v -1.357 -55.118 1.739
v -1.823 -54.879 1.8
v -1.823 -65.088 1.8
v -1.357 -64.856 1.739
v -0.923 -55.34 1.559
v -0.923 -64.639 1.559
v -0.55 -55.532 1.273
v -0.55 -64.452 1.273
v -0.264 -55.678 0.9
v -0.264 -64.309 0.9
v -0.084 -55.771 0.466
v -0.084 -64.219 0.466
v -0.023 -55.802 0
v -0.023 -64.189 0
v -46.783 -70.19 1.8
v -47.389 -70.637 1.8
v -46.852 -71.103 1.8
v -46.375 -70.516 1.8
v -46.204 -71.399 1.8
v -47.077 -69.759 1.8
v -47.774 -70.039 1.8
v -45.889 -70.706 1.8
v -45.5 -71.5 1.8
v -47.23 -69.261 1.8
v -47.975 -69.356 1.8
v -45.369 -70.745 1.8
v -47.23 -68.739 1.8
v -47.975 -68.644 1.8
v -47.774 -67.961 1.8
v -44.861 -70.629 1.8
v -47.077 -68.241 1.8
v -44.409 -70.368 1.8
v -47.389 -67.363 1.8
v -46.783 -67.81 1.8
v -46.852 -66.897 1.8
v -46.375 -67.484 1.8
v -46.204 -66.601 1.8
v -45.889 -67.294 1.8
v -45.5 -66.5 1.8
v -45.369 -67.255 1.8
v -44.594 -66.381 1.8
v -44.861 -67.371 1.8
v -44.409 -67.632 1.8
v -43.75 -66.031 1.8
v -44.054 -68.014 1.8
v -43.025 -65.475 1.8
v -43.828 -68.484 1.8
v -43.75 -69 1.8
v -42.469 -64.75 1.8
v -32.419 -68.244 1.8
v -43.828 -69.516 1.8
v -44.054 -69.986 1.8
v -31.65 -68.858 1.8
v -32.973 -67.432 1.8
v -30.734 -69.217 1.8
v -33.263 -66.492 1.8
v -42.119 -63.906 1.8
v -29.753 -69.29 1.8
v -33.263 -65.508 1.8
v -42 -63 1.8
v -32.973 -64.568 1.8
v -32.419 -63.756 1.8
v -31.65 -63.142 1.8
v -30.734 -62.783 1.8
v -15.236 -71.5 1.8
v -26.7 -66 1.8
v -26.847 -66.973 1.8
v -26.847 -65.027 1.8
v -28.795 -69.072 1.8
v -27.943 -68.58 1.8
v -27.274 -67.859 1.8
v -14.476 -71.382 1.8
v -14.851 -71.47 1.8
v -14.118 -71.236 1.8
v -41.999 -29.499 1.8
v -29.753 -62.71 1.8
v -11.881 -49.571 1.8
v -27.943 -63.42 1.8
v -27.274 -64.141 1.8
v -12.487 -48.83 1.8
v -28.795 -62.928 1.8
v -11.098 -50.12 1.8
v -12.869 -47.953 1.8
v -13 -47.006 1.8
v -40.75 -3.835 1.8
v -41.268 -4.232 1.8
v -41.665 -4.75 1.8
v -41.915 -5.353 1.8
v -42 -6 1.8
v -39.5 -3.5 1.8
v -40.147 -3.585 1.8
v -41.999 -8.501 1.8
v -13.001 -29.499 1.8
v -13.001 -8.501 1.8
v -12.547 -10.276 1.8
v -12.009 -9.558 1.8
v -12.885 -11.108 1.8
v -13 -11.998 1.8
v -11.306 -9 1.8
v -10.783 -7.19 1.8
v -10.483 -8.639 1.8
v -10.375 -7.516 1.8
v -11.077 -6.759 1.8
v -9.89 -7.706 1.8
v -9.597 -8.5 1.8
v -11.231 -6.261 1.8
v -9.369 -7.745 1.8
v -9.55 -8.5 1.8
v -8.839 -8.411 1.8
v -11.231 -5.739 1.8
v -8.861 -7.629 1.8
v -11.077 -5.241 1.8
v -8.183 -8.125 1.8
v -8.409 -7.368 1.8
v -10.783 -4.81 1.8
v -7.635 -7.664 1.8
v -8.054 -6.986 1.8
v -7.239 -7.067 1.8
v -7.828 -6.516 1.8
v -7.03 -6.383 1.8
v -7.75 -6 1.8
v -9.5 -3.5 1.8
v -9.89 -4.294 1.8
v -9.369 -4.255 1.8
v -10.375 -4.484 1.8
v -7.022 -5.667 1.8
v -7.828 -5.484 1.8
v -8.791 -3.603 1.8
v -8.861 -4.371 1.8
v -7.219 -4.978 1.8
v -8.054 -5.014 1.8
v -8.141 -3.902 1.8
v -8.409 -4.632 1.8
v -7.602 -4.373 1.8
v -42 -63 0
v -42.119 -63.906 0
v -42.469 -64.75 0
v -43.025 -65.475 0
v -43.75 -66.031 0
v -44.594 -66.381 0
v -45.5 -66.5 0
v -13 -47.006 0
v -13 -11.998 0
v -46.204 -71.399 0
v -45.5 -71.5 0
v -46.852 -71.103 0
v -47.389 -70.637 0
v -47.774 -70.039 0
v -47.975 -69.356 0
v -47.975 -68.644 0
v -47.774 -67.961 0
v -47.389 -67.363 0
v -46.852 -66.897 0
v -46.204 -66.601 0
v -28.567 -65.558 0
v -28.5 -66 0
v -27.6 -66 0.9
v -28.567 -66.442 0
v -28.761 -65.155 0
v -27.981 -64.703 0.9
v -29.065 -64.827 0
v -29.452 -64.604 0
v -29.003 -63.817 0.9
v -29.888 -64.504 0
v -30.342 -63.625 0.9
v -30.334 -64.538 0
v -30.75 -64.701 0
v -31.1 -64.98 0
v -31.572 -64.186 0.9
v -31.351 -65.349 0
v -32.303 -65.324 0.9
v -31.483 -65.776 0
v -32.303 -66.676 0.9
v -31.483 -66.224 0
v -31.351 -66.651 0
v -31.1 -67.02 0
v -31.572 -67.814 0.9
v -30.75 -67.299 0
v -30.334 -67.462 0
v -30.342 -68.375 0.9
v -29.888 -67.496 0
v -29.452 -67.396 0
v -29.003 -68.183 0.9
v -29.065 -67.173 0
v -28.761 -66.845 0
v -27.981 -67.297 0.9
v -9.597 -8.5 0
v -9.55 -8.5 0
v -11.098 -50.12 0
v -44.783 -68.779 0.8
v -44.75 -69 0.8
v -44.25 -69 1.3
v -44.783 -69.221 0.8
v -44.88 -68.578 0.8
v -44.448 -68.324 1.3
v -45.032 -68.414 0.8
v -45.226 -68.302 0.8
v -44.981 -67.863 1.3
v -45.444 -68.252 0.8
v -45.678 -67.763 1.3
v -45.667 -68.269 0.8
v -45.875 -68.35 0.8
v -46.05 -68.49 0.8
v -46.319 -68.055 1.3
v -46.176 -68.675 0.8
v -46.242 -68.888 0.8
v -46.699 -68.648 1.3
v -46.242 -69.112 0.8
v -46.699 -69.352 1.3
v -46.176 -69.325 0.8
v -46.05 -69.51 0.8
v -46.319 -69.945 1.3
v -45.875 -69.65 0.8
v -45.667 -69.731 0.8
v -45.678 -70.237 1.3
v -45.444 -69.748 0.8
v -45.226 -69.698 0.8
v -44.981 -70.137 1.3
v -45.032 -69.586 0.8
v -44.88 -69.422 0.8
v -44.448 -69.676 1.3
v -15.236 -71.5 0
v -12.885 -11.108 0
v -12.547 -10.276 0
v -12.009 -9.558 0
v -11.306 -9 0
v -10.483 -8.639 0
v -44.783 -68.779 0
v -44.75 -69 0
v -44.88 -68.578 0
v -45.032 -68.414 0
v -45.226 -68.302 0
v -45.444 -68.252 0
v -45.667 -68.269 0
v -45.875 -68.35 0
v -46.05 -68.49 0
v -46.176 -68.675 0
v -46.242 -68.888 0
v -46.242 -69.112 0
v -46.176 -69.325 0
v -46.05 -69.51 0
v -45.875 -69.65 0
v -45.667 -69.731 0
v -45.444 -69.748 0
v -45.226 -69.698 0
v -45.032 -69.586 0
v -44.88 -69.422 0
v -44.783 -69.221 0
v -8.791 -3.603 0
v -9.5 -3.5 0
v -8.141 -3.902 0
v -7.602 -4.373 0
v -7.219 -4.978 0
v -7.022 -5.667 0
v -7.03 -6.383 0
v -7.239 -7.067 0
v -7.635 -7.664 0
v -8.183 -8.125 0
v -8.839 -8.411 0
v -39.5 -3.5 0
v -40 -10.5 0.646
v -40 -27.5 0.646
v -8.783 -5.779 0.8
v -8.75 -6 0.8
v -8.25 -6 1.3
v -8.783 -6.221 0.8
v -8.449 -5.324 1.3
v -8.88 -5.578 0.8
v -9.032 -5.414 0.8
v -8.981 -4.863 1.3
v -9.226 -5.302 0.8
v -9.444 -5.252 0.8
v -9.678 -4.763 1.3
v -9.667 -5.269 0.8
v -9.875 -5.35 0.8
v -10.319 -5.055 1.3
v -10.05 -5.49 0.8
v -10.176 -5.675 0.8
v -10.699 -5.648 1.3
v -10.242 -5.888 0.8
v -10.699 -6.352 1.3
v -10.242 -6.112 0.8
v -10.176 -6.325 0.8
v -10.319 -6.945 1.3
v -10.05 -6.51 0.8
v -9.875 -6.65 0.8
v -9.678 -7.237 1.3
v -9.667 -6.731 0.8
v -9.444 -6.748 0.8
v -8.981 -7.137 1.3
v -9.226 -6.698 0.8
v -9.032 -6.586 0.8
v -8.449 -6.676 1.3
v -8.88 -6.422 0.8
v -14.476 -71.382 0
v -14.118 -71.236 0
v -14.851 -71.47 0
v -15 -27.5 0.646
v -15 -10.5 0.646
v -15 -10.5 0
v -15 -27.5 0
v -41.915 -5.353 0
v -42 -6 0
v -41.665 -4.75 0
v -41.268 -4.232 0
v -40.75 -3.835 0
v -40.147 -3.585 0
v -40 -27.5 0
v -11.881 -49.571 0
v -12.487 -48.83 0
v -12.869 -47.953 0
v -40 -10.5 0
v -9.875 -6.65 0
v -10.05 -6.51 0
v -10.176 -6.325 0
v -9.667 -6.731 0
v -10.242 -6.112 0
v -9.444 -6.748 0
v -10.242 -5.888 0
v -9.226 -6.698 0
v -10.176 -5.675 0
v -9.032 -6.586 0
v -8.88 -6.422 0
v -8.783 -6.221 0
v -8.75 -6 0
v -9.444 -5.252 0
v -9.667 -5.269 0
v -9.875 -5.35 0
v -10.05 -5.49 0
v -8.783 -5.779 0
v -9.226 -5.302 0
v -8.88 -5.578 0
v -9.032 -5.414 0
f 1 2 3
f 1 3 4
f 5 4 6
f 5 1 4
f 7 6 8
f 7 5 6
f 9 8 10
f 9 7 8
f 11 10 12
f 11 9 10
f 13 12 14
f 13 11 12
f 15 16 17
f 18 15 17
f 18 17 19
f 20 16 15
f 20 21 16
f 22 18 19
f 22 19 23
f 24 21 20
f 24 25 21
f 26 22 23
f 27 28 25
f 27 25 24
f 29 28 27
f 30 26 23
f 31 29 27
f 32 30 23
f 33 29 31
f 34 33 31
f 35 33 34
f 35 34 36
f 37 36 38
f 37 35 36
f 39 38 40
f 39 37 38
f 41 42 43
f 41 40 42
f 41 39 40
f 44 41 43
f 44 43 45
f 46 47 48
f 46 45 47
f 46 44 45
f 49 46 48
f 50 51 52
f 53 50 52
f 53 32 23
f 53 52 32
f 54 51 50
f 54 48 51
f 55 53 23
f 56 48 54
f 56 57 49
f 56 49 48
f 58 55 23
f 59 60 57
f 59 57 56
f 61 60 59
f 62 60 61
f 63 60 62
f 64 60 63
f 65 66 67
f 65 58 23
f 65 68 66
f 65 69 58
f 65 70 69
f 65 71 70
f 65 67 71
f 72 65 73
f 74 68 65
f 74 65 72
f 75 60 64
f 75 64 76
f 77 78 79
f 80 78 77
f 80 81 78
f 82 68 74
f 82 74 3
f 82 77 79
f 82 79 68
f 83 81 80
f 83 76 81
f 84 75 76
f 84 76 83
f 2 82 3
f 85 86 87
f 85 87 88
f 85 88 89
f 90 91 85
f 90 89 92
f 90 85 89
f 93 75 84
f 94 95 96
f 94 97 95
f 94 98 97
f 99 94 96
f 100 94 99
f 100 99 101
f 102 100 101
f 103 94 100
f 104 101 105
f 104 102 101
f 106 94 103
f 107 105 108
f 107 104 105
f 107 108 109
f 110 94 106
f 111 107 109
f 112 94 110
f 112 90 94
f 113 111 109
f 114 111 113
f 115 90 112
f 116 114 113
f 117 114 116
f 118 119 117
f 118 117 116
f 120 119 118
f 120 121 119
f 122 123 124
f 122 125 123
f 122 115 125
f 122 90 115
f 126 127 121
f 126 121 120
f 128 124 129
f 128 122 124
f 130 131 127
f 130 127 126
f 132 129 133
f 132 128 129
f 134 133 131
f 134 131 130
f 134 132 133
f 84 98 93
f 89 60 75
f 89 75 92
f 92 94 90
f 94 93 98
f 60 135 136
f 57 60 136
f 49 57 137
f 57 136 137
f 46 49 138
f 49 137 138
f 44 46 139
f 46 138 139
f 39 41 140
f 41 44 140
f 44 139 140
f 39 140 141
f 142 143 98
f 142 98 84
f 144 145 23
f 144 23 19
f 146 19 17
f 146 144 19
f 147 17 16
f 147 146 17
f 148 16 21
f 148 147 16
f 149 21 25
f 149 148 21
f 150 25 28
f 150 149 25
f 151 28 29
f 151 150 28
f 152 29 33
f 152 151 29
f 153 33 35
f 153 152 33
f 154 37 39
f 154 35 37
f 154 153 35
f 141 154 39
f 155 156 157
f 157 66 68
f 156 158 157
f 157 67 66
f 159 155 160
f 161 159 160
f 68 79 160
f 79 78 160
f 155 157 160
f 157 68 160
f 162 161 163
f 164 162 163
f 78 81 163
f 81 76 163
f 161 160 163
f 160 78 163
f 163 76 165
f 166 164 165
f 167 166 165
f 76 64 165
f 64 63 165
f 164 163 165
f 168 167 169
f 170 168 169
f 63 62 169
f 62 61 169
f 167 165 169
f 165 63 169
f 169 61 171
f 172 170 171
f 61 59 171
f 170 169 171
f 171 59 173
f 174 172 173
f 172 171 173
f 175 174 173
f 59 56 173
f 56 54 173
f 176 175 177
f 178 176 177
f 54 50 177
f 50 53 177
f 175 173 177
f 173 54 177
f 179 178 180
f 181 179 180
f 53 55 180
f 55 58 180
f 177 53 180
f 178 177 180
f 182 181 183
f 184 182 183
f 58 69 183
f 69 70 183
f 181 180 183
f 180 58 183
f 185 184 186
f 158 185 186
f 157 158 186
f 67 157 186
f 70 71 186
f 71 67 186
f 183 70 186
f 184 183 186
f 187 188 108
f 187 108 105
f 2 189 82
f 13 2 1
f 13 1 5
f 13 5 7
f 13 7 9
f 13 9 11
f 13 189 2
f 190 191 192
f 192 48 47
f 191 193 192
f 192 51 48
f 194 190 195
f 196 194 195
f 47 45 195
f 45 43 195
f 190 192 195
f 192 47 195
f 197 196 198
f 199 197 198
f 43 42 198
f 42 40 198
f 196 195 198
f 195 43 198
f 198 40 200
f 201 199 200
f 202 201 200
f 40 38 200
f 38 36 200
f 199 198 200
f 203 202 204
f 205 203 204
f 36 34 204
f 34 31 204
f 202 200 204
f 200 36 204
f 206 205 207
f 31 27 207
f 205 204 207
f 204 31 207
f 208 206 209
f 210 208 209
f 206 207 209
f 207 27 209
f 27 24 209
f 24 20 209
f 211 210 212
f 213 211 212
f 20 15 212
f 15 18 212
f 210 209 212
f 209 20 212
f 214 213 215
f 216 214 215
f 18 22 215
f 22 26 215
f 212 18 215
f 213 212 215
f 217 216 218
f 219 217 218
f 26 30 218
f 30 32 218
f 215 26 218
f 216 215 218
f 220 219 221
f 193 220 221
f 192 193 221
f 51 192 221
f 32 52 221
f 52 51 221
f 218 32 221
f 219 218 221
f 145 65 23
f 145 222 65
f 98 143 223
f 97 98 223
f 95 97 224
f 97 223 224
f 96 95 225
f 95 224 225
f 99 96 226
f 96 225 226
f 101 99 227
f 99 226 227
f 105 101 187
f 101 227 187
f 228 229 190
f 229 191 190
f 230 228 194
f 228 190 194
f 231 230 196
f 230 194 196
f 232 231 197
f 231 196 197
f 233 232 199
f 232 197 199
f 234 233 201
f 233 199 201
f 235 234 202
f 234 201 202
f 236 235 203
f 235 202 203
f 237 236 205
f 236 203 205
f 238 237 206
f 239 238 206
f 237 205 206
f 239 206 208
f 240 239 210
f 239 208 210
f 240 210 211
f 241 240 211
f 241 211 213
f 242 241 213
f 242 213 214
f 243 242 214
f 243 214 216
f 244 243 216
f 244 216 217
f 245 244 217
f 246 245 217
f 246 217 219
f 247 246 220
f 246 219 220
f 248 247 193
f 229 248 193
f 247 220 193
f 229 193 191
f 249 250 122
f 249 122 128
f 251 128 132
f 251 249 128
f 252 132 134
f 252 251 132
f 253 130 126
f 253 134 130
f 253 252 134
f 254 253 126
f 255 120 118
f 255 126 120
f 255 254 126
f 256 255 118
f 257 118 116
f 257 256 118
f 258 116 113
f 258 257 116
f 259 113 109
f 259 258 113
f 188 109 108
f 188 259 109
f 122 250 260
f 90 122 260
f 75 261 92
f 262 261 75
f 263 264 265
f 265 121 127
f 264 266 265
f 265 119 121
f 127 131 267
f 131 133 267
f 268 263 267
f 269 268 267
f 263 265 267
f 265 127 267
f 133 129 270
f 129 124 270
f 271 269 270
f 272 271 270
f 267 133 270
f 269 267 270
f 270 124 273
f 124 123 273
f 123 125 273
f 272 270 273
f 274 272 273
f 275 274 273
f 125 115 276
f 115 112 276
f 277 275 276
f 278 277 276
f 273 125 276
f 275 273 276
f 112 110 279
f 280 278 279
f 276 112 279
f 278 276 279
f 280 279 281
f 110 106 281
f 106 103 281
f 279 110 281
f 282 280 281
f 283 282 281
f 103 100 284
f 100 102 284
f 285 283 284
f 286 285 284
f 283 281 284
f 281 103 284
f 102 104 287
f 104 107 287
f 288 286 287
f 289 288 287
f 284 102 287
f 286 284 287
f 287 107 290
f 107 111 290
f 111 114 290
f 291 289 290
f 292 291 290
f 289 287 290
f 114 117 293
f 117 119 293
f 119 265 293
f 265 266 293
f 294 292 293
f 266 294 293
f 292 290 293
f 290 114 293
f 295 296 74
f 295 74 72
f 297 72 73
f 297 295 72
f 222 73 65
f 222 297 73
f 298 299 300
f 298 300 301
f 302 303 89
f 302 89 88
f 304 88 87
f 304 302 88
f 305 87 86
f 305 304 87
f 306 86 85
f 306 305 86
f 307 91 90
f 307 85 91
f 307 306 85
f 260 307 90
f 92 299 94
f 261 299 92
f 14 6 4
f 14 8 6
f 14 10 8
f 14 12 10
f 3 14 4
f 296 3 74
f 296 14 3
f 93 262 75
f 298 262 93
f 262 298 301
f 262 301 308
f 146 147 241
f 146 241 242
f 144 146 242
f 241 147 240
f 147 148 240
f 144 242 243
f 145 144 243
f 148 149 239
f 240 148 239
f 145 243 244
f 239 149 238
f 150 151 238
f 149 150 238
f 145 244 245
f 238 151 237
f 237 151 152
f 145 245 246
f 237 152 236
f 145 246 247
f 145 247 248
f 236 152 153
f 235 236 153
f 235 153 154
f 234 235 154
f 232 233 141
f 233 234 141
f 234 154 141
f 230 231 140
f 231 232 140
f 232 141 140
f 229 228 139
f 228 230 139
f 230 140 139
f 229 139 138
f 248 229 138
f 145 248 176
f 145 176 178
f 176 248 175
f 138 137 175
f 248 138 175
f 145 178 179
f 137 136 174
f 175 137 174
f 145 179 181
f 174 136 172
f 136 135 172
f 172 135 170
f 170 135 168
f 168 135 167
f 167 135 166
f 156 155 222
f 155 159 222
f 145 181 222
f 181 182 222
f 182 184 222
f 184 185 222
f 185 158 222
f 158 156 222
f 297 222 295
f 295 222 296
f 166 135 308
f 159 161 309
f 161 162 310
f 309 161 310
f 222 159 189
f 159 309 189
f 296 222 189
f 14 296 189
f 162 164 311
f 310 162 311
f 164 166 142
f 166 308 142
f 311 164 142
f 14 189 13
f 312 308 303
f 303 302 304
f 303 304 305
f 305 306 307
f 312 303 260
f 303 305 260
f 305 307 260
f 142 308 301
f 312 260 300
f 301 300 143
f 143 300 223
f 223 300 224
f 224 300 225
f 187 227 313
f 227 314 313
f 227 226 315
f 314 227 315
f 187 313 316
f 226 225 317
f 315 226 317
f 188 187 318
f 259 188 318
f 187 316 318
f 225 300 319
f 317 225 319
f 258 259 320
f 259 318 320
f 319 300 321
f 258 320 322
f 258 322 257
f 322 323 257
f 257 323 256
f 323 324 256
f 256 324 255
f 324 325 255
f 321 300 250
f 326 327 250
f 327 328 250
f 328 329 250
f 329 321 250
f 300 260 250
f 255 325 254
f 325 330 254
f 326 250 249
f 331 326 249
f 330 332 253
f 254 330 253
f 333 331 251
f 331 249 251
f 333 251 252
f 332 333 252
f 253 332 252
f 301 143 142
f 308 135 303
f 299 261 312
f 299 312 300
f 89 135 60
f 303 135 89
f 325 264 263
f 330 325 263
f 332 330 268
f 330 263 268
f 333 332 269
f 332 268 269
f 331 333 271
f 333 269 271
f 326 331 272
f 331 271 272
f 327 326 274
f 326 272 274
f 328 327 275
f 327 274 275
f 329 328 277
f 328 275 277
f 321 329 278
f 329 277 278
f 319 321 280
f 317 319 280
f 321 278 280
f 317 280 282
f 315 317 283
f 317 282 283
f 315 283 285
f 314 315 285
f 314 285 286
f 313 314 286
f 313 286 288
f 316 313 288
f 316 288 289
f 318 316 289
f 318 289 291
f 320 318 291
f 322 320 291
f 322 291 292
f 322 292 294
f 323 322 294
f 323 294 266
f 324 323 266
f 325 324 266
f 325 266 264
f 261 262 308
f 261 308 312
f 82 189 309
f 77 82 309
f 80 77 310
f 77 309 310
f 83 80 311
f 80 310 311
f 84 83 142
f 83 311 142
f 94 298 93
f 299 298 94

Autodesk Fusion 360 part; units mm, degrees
sketch "Esboço1" plane through (0, 0, 0) normal (0, 0, 1) x (1, 0, 0)
  line L0 (-0.023, -64.1886) -> (-14.118, -71.2361)
  arc A0 (-15.2361, -71.5) -> (-14.118, -71.2361) centre (-15.2361, -69) ccw
  line L1 (-15.2361, -71.5) -> (-42.5, -71.5)
  line L2 (-42.5, -71.5) -> (-45.5, -71.5)
  arc A1 (-45.5, -66.5) -> (-45.5, -71.5) centre (-45.5, -69) ccw
  arc A2 (-45.5, -66.5) -> (-42, -63) centre (-45.5, -63) ccw
  line L3 (-42, -63) -> (-42, -6)
  arc A3 (-39.5, -3.5) -> (-42, -6) centre (-39.5, -6) ccw
  line L4 (-39.5, -3.5) -> (-13, -3.5)
  line L5 (-9.5001, -3.5) -> (-13, -3.5)
  arc A4 (-9.5501, -8.4995) -> (-9.5001, -3.5) centre (-9.5001, -6) ccw
  line L6 (-9.5501, -8.4995) -> (-9.5966, -8.4995)
  arc A5 (-9.5966, -8.4995) -> (-13.0001, -11.9982) centre (-9.5001, -11.9982) ccw
  line L7 (-13.0001, -11.9982) -> (-13.0001, -47.0056)
  arc A6 (-13.0001, -47.0056) -> (-11.0979, -50.1196) centre (-9.5001, -47.0056) ccw
  line L8 (-11.0979, -50.1196) -> (-0.023, -55.8022)
  line L9 (-0.023, -64.1886) -> (-0.023, -55.8022)
extrude "Extrusão1" add sketch "Esboço1" along normal blind 1.8
sketch "Esboço2" plane through (0, 0, 1.8) normal (0, 0, 1) x (1, 0, 0)
  arc A0 (-15.2361, -71.5) -> (-14.118, -71.2361) centre (-15.2361, -69) ccw
  line L0 (-14.118, -71.2361) -> (-0.023, -64.1886)
  line L1 (-0.023, -64.1886) -> (-0.023, -55.8022)
  line L2 (-0.023, -55.8022) -> (-11.0979, -50.1196)
  arc A1 (-13.0001, -47.0056) -> (-11.0979, -50.1196) centre (-9.5001, -47.0056) ccw
  line L3 (-13.0001, -47.0056) -> (-13.0001, -11.9982)
  arc A2 (-9.5966, -8.4995) -> (-13.0001, -11.9982) centre (-9.5001, -11.9982) ccw
  line L4 (-9.5966, -8.4995) -> (-9.5501, -8.4995)
  arc A3 (-9.5501, -8.4995) -> (-9.5001, -3.5) centre (-9.5001, -6) ccw
  line L5 (-9.5001, -3.5) -> (-39.5, -3.5)
  arc A4 (-39.5, -3.5) -> (-42, -6) centre (-39.5, -6) ccw
  line L6 (-42, -6) -> (-42, -63)
  arc A5 (-45.5, -66.5) -> (-42, -63) centre (-45.5, -63) ccw
  arc A6 (-45.5, -66.5) -> (-45.5, -71.5) centre (-45.5, -69) ccw
  line L7 (-45.5, -71.5) -> (-42.5, -71.5)
  line L8 (-42.5, -71.5) -> (-15.2361, -71.5)
  circle A7 centre (-9.5001, -6) radius 0.75
  circle A8 centre (-45.5, -69) radius 0.75
  line L9 (-15.0001, -27.5) -> (-40.0001, -27.5)
  line L10 (-40.0001, -27.5) -> (-40.0001, -10.5)
  line L11 (-40.0001, -10.5) -> (-15.0001, -10.5)
  line L12 (-15.0001, -10.5) -> (-15.0001, -27.5)
  circle A9 centre (-30, -66) radius 1.5
  dimension "d10" = 1.5
  dimension "d11" = 1.5
  dimension "d12" = 25
  dimension "d13" = 17
  dimension "d14" = 2
  dimension "d15" = 1.9999
  dimension "d16" = 7
  dimension "d25" = 3
extrude "Extrusão2" cut sketch "Esboço2" against normal blind 4 contours A7 | A8 | L9 L10 L11 L12 | A9
chamfer "Chanfro1" distance 1.999 angle 30 4 edges at (-27.5001, -27.5, 1.8) (-40.0001, -19, 1.8) (-27.5001, -10.5, 1.8) (-15.0001, -19, 1.8) measured on face at (-27.7041, -46.3366, 1.8) measured on face at (-27.7041, -46.3366, 1.8) measured on face at (-27.7041, -46.3366, 1.8) measured on face at (-27.7041, -46.3366, 1.8)
fillet "Arredondamento1" radius 1.8 1 edges at (-0.023, -59.9954, 1.8)
chamfer "Chanfro2" distance 1 angle 45 2 edges at (-10.1993, -5.7288, 1.8) (-46.1992, -68.7288, 1.8) measured on face at (-28.3704, -47.0029, 1.8) measured on face at (-28.3704, -47.0029, 1.8)
chamfer "Chanfro3" distance 1.8 angle 45 1 edges at (-31.3985, -65.4576, 1.8) measured on face at (-28.3704, -47.0029, 1.8)
